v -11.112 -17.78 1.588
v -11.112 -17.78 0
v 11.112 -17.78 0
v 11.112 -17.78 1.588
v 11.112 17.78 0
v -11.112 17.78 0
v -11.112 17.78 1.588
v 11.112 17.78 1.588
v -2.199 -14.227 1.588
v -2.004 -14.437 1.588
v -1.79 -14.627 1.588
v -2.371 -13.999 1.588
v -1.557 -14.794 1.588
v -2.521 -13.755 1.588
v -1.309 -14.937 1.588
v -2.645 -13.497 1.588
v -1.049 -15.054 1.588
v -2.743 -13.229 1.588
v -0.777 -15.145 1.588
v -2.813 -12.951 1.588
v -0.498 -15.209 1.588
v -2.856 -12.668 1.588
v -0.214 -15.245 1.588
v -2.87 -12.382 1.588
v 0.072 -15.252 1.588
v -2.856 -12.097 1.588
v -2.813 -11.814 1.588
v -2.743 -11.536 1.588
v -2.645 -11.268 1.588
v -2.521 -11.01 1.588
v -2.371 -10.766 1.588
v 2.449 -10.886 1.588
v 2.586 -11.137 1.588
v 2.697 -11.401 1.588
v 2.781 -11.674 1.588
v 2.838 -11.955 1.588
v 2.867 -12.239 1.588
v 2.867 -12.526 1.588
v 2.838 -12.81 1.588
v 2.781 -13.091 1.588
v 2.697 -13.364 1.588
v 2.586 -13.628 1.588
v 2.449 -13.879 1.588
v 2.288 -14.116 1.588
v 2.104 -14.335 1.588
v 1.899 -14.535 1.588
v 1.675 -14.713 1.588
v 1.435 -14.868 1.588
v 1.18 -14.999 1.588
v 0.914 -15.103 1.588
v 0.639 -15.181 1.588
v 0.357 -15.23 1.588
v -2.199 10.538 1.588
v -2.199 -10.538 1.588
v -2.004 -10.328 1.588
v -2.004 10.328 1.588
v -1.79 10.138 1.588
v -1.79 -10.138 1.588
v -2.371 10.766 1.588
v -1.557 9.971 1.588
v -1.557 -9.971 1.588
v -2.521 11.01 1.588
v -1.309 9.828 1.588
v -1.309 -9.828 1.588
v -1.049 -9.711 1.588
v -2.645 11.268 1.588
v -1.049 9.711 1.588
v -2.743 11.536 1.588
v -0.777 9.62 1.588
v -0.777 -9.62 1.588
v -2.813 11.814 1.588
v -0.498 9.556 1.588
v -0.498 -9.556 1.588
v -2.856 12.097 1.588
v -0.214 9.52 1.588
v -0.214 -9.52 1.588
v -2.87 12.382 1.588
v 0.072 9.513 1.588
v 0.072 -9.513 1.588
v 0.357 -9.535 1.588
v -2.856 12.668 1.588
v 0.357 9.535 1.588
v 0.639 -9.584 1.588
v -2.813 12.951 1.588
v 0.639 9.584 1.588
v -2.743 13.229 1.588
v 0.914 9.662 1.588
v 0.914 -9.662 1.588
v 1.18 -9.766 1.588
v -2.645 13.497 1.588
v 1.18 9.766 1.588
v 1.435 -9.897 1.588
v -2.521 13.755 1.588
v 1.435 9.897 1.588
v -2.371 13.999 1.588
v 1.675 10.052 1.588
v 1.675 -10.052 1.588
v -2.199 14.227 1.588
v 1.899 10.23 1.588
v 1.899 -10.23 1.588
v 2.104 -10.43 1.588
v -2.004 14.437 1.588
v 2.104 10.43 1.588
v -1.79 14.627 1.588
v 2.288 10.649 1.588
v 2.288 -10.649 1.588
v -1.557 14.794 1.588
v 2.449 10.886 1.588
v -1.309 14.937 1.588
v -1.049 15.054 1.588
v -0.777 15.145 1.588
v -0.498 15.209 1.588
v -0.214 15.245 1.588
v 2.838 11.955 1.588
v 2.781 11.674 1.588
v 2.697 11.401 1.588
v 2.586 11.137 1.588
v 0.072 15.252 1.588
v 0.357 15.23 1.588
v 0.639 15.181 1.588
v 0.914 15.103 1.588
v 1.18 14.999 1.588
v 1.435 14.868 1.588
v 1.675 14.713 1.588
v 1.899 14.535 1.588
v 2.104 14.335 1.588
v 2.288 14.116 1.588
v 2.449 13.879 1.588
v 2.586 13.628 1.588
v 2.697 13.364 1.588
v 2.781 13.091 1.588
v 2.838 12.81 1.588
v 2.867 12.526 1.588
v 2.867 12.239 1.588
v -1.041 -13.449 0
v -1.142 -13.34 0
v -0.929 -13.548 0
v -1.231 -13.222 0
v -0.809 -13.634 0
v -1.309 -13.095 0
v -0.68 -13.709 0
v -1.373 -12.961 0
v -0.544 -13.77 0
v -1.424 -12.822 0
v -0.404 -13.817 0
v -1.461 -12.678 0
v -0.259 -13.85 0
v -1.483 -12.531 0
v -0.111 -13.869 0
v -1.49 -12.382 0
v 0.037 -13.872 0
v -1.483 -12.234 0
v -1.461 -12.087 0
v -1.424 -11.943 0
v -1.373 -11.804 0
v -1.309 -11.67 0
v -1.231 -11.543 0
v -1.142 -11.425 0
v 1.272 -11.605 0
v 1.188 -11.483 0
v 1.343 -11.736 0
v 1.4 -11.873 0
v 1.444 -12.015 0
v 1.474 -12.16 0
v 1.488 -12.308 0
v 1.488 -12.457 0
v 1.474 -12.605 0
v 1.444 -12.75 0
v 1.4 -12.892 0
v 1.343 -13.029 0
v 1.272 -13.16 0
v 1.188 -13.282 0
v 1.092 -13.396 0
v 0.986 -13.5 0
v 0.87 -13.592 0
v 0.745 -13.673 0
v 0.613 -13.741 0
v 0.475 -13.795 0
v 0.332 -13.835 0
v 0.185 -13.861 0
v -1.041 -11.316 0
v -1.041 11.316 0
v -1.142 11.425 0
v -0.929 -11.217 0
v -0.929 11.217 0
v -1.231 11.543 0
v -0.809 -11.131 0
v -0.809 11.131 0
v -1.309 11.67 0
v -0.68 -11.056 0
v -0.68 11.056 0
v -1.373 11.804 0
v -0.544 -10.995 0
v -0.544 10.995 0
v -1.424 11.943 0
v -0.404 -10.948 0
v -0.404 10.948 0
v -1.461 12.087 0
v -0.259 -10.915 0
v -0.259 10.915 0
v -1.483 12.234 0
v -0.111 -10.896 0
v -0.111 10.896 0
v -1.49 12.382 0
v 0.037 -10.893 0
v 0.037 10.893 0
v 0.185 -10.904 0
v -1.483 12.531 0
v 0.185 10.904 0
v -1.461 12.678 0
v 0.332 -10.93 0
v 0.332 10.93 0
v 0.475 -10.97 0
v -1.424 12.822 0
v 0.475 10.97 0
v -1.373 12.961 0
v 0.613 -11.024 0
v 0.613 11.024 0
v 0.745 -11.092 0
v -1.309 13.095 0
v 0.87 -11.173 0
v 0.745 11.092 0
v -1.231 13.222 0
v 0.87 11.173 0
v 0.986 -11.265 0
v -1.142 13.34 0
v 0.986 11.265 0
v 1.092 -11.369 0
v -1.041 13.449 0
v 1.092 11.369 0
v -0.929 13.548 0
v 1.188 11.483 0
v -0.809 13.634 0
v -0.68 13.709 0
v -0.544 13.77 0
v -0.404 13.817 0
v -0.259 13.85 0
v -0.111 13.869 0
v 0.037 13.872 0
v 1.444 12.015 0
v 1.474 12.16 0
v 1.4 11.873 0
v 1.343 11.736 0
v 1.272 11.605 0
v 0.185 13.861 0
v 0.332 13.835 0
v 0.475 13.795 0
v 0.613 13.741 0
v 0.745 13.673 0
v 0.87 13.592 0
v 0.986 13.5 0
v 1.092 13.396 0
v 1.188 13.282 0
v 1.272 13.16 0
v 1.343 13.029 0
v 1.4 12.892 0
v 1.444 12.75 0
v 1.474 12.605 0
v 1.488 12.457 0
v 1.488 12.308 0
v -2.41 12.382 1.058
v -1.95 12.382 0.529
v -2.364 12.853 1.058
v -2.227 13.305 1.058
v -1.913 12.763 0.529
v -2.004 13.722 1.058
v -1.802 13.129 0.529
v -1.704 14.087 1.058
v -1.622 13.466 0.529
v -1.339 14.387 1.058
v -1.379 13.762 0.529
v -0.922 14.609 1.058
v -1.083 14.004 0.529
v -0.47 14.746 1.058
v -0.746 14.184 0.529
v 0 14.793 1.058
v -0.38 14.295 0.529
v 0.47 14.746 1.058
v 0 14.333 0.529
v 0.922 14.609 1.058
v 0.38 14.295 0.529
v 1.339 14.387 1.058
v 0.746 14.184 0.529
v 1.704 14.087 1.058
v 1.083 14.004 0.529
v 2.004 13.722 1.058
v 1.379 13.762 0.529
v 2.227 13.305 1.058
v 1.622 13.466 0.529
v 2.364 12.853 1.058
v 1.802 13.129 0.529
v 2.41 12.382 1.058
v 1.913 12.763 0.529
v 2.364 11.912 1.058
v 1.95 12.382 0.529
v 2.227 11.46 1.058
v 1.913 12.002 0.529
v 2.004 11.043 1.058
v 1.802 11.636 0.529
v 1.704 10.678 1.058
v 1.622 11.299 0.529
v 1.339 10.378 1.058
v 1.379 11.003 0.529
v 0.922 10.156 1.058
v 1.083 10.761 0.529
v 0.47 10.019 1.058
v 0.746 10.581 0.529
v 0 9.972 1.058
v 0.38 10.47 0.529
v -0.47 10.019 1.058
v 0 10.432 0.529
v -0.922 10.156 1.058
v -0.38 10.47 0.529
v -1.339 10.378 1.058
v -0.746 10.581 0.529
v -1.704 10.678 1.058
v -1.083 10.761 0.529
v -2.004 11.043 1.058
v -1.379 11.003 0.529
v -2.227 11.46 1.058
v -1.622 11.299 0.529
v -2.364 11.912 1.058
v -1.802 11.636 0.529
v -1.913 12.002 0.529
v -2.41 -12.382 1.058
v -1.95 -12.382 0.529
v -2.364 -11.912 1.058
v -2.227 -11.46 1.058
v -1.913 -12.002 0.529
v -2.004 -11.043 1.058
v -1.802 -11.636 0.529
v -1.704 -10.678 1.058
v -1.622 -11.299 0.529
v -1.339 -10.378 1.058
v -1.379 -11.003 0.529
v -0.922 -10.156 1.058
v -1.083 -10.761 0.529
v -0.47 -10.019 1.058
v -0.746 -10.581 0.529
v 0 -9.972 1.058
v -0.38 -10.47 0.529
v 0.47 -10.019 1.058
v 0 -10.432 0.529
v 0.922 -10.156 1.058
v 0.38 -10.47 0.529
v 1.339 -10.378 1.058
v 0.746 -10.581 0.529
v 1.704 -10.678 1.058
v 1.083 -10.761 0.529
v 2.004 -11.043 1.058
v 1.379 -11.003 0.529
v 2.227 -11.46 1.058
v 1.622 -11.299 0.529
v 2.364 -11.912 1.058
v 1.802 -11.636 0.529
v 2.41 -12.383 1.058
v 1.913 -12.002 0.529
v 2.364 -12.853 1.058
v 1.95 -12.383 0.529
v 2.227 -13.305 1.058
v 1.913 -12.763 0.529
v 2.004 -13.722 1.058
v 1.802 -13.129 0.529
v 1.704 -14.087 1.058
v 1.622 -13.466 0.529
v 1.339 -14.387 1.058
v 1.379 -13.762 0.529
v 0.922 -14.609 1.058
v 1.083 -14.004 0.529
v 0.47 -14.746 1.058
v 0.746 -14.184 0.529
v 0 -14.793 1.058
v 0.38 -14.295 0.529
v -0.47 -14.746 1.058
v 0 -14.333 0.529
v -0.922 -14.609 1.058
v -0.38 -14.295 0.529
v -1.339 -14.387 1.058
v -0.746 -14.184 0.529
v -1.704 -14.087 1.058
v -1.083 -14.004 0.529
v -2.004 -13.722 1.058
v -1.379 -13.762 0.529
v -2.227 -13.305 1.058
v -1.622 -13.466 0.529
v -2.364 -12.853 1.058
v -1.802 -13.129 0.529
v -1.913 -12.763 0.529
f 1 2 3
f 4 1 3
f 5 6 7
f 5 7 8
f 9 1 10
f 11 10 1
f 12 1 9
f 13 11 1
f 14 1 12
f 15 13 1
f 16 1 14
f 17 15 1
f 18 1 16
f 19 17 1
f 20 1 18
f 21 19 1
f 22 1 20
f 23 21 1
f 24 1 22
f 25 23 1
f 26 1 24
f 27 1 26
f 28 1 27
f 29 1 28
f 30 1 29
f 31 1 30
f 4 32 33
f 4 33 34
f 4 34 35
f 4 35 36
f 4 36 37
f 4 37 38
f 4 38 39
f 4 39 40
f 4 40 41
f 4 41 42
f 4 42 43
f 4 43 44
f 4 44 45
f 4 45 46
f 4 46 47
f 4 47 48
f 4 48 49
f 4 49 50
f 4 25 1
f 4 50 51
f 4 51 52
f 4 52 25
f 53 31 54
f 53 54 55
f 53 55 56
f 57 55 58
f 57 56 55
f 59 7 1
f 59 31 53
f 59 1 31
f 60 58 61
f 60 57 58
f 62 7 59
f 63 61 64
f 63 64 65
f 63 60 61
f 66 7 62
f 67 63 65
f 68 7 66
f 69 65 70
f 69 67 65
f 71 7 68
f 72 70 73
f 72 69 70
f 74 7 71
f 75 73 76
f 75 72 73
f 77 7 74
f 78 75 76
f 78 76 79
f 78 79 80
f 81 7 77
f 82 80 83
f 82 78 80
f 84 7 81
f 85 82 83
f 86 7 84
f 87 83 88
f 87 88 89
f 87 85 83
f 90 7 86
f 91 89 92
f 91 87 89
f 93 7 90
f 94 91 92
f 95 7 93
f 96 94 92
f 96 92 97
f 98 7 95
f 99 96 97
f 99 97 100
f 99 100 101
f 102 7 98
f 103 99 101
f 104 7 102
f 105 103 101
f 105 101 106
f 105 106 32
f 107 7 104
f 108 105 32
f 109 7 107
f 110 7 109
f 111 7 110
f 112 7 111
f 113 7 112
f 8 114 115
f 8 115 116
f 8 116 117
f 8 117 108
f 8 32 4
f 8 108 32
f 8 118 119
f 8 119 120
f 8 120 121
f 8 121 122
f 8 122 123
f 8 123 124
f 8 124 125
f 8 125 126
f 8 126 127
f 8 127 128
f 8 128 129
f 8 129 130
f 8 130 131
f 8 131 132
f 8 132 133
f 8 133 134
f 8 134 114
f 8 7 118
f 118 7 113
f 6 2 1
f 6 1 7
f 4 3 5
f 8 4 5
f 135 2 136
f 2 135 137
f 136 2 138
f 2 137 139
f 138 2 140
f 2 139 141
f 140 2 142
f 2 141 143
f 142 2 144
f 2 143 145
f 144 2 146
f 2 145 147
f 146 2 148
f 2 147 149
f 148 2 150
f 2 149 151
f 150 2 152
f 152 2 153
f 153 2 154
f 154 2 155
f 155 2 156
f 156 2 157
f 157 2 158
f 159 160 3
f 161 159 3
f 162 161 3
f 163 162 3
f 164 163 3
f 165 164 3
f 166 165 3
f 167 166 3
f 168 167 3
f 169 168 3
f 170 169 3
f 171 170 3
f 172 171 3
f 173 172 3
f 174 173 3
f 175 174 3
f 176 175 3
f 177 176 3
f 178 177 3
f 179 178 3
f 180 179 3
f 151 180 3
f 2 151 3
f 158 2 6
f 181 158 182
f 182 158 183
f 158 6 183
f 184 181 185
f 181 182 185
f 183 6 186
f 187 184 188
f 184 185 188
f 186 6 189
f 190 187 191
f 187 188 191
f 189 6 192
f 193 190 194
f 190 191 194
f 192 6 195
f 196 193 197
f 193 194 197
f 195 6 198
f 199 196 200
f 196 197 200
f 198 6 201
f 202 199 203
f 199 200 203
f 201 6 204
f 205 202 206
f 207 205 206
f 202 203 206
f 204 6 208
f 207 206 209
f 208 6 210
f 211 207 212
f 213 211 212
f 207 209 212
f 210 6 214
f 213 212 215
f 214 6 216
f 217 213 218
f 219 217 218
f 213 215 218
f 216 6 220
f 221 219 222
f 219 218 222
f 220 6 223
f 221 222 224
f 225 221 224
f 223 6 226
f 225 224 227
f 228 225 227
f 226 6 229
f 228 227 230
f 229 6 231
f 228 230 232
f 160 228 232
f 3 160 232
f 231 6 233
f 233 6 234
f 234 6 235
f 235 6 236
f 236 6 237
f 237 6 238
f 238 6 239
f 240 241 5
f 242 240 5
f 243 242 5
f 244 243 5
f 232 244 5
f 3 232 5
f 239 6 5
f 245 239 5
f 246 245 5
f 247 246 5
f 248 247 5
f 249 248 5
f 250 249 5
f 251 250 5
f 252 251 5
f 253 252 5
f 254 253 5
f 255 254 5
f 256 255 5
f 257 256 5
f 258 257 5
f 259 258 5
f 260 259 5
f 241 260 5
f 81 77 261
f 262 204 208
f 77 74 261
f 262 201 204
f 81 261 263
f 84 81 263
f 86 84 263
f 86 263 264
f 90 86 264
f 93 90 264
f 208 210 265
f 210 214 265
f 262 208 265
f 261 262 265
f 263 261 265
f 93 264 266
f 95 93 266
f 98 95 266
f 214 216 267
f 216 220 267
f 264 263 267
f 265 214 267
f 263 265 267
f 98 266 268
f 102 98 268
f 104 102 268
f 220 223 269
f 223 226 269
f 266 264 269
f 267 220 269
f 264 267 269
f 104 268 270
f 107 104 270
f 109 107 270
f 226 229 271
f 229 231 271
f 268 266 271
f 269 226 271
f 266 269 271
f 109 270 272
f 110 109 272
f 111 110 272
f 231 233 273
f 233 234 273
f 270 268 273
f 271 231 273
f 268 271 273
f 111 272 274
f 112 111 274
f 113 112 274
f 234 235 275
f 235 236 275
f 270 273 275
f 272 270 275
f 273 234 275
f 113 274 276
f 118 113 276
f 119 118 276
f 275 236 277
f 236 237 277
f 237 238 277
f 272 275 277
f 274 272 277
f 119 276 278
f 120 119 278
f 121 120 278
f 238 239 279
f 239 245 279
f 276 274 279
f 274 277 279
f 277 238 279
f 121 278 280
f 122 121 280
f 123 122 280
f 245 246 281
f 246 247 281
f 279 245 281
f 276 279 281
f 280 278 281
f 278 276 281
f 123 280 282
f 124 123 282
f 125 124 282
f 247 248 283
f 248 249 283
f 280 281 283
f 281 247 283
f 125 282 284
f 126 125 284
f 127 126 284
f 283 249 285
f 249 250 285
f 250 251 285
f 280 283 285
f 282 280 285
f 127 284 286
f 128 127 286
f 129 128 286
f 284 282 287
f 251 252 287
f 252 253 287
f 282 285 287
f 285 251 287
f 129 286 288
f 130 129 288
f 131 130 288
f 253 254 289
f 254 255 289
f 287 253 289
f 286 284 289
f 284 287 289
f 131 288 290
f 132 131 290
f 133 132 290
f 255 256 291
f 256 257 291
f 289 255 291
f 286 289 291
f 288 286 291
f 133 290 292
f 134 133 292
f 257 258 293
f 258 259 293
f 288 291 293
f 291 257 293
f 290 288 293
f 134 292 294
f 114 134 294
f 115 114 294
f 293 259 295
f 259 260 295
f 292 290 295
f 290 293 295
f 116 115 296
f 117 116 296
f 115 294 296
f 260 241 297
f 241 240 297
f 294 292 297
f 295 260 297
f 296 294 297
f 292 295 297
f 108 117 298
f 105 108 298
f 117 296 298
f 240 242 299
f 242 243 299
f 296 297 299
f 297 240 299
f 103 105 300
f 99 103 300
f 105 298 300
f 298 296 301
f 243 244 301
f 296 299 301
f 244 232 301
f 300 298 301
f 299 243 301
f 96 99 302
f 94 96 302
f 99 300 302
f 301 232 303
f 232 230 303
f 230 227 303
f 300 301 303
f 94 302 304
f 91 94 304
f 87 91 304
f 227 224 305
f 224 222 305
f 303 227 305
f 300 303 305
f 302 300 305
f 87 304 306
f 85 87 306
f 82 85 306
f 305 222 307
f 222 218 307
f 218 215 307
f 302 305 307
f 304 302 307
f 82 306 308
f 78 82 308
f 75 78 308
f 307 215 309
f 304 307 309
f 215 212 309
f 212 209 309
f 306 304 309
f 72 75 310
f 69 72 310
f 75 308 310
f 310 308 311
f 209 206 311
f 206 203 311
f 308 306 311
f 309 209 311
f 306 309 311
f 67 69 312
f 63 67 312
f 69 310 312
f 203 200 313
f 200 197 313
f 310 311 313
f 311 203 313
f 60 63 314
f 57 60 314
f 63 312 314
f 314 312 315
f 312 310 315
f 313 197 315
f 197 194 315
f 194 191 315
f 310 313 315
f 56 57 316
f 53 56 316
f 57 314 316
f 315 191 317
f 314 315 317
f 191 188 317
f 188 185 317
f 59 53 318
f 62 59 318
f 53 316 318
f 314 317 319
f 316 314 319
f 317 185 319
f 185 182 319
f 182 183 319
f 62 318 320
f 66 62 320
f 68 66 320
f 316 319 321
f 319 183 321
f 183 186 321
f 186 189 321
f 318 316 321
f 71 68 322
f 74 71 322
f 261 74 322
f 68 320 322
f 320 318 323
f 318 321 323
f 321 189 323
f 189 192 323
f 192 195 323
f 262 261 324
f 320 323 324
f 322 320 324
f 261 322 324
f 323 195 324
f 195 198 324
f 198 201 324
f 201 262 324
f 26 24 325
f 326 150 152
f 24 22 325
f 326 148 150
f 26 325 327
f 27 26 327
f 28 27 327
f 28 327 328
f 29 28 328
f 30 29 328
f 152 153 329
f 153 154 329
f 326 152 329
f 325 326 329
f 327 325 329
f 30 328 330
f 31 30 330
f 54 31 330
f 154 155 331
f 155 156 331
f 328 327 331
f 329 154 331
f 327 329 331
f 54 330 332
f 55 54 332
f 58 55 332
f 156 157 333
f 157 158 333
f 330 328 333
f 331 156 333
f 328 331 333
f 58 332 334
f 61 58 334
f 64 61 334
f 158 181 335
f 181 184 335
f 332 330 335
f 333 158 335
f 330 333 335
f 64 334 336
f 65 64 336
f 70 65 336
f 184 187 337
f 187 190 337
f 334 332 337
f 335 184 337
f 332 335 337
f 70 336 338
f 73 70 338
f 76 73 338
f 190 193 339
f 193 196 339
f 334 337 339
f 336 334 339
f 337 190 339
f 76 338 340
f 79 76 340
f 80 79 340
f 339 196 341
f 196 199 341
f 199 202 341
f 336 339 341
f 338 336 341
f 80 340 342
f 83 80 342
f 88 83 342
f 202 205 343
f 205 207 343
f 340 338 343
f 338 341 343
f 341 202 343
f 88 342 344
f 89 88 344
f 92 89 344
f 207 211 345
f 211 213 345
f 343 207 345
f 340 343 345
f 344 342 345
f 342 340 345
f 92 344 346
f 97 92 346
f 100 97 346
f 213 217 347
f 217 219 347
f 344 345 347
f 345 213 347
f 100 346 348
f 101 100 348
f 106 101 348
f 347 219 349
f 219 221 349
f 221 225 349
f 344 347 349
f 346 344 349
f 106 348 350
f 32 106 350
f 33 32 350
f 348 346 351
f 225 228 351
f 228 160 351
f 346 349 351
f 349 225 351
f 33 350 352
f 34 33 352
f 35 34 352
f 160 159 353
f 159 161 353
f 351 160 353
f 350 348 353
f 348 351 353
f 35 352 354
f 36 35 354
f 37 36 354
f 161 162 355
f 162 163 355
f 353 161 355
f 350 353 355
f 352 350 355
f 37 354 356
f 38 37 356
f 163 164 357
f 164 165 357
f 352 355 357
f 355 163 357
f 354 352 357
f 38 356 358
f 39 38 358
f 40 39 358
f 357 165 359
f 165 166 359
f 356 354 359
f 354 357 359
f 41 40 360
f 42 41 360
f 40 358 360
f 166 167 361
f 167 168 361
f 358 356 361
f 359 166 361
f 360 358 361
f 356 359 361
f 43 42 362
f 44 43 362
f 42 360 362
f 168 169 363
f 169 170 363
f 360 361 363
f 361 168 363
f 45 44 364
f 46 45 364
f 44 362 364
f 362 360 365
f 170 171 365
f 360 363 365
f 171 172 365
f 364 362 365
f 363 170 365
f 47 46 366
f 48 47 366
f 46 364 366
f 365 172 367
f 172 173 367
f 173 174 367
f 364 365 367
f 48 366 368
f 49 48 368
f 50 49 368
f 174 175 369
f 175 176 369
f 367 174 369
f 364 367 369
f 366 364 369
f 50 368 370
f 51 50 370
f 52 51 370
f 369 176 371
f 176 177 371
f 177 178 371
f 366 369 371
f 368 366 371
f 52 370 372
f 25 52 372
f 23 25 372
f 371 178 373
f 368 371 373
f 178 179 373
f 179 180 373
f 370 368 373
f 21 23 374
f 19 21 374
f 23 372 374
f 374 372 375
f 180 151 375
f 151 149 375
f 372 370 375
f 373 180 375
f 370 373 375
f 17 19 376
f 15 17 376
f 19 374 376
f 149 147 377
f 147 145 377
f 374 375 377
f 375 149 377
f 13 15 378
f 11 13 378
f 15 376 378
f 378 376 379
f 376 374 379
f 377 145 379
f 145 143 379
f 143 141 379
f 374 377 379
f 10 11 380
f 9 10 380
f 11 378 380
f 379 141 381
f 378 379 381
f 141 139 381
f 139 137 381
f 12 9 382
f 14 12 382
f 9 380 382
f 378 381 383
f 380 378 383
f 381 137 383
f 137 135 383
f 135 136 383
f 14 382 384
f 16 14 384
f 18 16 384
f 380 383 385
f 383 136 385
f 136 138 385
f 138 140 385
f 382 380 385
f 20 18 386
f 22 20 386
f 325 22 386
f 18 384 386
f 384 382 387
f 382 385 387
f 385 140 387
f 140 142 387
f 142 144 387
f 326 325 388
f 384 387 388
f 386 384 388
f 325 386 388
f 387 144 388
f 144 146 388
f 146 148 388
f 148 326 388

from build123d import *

# Parameters (mm, degrees)
F0_W           = 22.225
F0_H           = 35.56
F1_DEPTH       = 1.5875
F3_D           = 2.9464
F3_CSINK_D     = 5.7404
F3_CSINK_ANGLE = 82


with BuildPart() as f1:
    # F0 (on Top) → F1 (new body)
    with BuildSketch(Plane.XY):
        Rectangle(F0_W, F0_H)
    extrude(amount=F1_DEPTH)

    # F3 (through all)
    with Locations(Plane.XY.offset(1.5875)):
        with Locations((0, 12.3825), (0, -12.3825)):
            CounterSinkHole(F3_D / 2, F3_CSINK_D / 2, counter_sink_angle=F3_CSINK_ANGLE)


solid = f1.part
